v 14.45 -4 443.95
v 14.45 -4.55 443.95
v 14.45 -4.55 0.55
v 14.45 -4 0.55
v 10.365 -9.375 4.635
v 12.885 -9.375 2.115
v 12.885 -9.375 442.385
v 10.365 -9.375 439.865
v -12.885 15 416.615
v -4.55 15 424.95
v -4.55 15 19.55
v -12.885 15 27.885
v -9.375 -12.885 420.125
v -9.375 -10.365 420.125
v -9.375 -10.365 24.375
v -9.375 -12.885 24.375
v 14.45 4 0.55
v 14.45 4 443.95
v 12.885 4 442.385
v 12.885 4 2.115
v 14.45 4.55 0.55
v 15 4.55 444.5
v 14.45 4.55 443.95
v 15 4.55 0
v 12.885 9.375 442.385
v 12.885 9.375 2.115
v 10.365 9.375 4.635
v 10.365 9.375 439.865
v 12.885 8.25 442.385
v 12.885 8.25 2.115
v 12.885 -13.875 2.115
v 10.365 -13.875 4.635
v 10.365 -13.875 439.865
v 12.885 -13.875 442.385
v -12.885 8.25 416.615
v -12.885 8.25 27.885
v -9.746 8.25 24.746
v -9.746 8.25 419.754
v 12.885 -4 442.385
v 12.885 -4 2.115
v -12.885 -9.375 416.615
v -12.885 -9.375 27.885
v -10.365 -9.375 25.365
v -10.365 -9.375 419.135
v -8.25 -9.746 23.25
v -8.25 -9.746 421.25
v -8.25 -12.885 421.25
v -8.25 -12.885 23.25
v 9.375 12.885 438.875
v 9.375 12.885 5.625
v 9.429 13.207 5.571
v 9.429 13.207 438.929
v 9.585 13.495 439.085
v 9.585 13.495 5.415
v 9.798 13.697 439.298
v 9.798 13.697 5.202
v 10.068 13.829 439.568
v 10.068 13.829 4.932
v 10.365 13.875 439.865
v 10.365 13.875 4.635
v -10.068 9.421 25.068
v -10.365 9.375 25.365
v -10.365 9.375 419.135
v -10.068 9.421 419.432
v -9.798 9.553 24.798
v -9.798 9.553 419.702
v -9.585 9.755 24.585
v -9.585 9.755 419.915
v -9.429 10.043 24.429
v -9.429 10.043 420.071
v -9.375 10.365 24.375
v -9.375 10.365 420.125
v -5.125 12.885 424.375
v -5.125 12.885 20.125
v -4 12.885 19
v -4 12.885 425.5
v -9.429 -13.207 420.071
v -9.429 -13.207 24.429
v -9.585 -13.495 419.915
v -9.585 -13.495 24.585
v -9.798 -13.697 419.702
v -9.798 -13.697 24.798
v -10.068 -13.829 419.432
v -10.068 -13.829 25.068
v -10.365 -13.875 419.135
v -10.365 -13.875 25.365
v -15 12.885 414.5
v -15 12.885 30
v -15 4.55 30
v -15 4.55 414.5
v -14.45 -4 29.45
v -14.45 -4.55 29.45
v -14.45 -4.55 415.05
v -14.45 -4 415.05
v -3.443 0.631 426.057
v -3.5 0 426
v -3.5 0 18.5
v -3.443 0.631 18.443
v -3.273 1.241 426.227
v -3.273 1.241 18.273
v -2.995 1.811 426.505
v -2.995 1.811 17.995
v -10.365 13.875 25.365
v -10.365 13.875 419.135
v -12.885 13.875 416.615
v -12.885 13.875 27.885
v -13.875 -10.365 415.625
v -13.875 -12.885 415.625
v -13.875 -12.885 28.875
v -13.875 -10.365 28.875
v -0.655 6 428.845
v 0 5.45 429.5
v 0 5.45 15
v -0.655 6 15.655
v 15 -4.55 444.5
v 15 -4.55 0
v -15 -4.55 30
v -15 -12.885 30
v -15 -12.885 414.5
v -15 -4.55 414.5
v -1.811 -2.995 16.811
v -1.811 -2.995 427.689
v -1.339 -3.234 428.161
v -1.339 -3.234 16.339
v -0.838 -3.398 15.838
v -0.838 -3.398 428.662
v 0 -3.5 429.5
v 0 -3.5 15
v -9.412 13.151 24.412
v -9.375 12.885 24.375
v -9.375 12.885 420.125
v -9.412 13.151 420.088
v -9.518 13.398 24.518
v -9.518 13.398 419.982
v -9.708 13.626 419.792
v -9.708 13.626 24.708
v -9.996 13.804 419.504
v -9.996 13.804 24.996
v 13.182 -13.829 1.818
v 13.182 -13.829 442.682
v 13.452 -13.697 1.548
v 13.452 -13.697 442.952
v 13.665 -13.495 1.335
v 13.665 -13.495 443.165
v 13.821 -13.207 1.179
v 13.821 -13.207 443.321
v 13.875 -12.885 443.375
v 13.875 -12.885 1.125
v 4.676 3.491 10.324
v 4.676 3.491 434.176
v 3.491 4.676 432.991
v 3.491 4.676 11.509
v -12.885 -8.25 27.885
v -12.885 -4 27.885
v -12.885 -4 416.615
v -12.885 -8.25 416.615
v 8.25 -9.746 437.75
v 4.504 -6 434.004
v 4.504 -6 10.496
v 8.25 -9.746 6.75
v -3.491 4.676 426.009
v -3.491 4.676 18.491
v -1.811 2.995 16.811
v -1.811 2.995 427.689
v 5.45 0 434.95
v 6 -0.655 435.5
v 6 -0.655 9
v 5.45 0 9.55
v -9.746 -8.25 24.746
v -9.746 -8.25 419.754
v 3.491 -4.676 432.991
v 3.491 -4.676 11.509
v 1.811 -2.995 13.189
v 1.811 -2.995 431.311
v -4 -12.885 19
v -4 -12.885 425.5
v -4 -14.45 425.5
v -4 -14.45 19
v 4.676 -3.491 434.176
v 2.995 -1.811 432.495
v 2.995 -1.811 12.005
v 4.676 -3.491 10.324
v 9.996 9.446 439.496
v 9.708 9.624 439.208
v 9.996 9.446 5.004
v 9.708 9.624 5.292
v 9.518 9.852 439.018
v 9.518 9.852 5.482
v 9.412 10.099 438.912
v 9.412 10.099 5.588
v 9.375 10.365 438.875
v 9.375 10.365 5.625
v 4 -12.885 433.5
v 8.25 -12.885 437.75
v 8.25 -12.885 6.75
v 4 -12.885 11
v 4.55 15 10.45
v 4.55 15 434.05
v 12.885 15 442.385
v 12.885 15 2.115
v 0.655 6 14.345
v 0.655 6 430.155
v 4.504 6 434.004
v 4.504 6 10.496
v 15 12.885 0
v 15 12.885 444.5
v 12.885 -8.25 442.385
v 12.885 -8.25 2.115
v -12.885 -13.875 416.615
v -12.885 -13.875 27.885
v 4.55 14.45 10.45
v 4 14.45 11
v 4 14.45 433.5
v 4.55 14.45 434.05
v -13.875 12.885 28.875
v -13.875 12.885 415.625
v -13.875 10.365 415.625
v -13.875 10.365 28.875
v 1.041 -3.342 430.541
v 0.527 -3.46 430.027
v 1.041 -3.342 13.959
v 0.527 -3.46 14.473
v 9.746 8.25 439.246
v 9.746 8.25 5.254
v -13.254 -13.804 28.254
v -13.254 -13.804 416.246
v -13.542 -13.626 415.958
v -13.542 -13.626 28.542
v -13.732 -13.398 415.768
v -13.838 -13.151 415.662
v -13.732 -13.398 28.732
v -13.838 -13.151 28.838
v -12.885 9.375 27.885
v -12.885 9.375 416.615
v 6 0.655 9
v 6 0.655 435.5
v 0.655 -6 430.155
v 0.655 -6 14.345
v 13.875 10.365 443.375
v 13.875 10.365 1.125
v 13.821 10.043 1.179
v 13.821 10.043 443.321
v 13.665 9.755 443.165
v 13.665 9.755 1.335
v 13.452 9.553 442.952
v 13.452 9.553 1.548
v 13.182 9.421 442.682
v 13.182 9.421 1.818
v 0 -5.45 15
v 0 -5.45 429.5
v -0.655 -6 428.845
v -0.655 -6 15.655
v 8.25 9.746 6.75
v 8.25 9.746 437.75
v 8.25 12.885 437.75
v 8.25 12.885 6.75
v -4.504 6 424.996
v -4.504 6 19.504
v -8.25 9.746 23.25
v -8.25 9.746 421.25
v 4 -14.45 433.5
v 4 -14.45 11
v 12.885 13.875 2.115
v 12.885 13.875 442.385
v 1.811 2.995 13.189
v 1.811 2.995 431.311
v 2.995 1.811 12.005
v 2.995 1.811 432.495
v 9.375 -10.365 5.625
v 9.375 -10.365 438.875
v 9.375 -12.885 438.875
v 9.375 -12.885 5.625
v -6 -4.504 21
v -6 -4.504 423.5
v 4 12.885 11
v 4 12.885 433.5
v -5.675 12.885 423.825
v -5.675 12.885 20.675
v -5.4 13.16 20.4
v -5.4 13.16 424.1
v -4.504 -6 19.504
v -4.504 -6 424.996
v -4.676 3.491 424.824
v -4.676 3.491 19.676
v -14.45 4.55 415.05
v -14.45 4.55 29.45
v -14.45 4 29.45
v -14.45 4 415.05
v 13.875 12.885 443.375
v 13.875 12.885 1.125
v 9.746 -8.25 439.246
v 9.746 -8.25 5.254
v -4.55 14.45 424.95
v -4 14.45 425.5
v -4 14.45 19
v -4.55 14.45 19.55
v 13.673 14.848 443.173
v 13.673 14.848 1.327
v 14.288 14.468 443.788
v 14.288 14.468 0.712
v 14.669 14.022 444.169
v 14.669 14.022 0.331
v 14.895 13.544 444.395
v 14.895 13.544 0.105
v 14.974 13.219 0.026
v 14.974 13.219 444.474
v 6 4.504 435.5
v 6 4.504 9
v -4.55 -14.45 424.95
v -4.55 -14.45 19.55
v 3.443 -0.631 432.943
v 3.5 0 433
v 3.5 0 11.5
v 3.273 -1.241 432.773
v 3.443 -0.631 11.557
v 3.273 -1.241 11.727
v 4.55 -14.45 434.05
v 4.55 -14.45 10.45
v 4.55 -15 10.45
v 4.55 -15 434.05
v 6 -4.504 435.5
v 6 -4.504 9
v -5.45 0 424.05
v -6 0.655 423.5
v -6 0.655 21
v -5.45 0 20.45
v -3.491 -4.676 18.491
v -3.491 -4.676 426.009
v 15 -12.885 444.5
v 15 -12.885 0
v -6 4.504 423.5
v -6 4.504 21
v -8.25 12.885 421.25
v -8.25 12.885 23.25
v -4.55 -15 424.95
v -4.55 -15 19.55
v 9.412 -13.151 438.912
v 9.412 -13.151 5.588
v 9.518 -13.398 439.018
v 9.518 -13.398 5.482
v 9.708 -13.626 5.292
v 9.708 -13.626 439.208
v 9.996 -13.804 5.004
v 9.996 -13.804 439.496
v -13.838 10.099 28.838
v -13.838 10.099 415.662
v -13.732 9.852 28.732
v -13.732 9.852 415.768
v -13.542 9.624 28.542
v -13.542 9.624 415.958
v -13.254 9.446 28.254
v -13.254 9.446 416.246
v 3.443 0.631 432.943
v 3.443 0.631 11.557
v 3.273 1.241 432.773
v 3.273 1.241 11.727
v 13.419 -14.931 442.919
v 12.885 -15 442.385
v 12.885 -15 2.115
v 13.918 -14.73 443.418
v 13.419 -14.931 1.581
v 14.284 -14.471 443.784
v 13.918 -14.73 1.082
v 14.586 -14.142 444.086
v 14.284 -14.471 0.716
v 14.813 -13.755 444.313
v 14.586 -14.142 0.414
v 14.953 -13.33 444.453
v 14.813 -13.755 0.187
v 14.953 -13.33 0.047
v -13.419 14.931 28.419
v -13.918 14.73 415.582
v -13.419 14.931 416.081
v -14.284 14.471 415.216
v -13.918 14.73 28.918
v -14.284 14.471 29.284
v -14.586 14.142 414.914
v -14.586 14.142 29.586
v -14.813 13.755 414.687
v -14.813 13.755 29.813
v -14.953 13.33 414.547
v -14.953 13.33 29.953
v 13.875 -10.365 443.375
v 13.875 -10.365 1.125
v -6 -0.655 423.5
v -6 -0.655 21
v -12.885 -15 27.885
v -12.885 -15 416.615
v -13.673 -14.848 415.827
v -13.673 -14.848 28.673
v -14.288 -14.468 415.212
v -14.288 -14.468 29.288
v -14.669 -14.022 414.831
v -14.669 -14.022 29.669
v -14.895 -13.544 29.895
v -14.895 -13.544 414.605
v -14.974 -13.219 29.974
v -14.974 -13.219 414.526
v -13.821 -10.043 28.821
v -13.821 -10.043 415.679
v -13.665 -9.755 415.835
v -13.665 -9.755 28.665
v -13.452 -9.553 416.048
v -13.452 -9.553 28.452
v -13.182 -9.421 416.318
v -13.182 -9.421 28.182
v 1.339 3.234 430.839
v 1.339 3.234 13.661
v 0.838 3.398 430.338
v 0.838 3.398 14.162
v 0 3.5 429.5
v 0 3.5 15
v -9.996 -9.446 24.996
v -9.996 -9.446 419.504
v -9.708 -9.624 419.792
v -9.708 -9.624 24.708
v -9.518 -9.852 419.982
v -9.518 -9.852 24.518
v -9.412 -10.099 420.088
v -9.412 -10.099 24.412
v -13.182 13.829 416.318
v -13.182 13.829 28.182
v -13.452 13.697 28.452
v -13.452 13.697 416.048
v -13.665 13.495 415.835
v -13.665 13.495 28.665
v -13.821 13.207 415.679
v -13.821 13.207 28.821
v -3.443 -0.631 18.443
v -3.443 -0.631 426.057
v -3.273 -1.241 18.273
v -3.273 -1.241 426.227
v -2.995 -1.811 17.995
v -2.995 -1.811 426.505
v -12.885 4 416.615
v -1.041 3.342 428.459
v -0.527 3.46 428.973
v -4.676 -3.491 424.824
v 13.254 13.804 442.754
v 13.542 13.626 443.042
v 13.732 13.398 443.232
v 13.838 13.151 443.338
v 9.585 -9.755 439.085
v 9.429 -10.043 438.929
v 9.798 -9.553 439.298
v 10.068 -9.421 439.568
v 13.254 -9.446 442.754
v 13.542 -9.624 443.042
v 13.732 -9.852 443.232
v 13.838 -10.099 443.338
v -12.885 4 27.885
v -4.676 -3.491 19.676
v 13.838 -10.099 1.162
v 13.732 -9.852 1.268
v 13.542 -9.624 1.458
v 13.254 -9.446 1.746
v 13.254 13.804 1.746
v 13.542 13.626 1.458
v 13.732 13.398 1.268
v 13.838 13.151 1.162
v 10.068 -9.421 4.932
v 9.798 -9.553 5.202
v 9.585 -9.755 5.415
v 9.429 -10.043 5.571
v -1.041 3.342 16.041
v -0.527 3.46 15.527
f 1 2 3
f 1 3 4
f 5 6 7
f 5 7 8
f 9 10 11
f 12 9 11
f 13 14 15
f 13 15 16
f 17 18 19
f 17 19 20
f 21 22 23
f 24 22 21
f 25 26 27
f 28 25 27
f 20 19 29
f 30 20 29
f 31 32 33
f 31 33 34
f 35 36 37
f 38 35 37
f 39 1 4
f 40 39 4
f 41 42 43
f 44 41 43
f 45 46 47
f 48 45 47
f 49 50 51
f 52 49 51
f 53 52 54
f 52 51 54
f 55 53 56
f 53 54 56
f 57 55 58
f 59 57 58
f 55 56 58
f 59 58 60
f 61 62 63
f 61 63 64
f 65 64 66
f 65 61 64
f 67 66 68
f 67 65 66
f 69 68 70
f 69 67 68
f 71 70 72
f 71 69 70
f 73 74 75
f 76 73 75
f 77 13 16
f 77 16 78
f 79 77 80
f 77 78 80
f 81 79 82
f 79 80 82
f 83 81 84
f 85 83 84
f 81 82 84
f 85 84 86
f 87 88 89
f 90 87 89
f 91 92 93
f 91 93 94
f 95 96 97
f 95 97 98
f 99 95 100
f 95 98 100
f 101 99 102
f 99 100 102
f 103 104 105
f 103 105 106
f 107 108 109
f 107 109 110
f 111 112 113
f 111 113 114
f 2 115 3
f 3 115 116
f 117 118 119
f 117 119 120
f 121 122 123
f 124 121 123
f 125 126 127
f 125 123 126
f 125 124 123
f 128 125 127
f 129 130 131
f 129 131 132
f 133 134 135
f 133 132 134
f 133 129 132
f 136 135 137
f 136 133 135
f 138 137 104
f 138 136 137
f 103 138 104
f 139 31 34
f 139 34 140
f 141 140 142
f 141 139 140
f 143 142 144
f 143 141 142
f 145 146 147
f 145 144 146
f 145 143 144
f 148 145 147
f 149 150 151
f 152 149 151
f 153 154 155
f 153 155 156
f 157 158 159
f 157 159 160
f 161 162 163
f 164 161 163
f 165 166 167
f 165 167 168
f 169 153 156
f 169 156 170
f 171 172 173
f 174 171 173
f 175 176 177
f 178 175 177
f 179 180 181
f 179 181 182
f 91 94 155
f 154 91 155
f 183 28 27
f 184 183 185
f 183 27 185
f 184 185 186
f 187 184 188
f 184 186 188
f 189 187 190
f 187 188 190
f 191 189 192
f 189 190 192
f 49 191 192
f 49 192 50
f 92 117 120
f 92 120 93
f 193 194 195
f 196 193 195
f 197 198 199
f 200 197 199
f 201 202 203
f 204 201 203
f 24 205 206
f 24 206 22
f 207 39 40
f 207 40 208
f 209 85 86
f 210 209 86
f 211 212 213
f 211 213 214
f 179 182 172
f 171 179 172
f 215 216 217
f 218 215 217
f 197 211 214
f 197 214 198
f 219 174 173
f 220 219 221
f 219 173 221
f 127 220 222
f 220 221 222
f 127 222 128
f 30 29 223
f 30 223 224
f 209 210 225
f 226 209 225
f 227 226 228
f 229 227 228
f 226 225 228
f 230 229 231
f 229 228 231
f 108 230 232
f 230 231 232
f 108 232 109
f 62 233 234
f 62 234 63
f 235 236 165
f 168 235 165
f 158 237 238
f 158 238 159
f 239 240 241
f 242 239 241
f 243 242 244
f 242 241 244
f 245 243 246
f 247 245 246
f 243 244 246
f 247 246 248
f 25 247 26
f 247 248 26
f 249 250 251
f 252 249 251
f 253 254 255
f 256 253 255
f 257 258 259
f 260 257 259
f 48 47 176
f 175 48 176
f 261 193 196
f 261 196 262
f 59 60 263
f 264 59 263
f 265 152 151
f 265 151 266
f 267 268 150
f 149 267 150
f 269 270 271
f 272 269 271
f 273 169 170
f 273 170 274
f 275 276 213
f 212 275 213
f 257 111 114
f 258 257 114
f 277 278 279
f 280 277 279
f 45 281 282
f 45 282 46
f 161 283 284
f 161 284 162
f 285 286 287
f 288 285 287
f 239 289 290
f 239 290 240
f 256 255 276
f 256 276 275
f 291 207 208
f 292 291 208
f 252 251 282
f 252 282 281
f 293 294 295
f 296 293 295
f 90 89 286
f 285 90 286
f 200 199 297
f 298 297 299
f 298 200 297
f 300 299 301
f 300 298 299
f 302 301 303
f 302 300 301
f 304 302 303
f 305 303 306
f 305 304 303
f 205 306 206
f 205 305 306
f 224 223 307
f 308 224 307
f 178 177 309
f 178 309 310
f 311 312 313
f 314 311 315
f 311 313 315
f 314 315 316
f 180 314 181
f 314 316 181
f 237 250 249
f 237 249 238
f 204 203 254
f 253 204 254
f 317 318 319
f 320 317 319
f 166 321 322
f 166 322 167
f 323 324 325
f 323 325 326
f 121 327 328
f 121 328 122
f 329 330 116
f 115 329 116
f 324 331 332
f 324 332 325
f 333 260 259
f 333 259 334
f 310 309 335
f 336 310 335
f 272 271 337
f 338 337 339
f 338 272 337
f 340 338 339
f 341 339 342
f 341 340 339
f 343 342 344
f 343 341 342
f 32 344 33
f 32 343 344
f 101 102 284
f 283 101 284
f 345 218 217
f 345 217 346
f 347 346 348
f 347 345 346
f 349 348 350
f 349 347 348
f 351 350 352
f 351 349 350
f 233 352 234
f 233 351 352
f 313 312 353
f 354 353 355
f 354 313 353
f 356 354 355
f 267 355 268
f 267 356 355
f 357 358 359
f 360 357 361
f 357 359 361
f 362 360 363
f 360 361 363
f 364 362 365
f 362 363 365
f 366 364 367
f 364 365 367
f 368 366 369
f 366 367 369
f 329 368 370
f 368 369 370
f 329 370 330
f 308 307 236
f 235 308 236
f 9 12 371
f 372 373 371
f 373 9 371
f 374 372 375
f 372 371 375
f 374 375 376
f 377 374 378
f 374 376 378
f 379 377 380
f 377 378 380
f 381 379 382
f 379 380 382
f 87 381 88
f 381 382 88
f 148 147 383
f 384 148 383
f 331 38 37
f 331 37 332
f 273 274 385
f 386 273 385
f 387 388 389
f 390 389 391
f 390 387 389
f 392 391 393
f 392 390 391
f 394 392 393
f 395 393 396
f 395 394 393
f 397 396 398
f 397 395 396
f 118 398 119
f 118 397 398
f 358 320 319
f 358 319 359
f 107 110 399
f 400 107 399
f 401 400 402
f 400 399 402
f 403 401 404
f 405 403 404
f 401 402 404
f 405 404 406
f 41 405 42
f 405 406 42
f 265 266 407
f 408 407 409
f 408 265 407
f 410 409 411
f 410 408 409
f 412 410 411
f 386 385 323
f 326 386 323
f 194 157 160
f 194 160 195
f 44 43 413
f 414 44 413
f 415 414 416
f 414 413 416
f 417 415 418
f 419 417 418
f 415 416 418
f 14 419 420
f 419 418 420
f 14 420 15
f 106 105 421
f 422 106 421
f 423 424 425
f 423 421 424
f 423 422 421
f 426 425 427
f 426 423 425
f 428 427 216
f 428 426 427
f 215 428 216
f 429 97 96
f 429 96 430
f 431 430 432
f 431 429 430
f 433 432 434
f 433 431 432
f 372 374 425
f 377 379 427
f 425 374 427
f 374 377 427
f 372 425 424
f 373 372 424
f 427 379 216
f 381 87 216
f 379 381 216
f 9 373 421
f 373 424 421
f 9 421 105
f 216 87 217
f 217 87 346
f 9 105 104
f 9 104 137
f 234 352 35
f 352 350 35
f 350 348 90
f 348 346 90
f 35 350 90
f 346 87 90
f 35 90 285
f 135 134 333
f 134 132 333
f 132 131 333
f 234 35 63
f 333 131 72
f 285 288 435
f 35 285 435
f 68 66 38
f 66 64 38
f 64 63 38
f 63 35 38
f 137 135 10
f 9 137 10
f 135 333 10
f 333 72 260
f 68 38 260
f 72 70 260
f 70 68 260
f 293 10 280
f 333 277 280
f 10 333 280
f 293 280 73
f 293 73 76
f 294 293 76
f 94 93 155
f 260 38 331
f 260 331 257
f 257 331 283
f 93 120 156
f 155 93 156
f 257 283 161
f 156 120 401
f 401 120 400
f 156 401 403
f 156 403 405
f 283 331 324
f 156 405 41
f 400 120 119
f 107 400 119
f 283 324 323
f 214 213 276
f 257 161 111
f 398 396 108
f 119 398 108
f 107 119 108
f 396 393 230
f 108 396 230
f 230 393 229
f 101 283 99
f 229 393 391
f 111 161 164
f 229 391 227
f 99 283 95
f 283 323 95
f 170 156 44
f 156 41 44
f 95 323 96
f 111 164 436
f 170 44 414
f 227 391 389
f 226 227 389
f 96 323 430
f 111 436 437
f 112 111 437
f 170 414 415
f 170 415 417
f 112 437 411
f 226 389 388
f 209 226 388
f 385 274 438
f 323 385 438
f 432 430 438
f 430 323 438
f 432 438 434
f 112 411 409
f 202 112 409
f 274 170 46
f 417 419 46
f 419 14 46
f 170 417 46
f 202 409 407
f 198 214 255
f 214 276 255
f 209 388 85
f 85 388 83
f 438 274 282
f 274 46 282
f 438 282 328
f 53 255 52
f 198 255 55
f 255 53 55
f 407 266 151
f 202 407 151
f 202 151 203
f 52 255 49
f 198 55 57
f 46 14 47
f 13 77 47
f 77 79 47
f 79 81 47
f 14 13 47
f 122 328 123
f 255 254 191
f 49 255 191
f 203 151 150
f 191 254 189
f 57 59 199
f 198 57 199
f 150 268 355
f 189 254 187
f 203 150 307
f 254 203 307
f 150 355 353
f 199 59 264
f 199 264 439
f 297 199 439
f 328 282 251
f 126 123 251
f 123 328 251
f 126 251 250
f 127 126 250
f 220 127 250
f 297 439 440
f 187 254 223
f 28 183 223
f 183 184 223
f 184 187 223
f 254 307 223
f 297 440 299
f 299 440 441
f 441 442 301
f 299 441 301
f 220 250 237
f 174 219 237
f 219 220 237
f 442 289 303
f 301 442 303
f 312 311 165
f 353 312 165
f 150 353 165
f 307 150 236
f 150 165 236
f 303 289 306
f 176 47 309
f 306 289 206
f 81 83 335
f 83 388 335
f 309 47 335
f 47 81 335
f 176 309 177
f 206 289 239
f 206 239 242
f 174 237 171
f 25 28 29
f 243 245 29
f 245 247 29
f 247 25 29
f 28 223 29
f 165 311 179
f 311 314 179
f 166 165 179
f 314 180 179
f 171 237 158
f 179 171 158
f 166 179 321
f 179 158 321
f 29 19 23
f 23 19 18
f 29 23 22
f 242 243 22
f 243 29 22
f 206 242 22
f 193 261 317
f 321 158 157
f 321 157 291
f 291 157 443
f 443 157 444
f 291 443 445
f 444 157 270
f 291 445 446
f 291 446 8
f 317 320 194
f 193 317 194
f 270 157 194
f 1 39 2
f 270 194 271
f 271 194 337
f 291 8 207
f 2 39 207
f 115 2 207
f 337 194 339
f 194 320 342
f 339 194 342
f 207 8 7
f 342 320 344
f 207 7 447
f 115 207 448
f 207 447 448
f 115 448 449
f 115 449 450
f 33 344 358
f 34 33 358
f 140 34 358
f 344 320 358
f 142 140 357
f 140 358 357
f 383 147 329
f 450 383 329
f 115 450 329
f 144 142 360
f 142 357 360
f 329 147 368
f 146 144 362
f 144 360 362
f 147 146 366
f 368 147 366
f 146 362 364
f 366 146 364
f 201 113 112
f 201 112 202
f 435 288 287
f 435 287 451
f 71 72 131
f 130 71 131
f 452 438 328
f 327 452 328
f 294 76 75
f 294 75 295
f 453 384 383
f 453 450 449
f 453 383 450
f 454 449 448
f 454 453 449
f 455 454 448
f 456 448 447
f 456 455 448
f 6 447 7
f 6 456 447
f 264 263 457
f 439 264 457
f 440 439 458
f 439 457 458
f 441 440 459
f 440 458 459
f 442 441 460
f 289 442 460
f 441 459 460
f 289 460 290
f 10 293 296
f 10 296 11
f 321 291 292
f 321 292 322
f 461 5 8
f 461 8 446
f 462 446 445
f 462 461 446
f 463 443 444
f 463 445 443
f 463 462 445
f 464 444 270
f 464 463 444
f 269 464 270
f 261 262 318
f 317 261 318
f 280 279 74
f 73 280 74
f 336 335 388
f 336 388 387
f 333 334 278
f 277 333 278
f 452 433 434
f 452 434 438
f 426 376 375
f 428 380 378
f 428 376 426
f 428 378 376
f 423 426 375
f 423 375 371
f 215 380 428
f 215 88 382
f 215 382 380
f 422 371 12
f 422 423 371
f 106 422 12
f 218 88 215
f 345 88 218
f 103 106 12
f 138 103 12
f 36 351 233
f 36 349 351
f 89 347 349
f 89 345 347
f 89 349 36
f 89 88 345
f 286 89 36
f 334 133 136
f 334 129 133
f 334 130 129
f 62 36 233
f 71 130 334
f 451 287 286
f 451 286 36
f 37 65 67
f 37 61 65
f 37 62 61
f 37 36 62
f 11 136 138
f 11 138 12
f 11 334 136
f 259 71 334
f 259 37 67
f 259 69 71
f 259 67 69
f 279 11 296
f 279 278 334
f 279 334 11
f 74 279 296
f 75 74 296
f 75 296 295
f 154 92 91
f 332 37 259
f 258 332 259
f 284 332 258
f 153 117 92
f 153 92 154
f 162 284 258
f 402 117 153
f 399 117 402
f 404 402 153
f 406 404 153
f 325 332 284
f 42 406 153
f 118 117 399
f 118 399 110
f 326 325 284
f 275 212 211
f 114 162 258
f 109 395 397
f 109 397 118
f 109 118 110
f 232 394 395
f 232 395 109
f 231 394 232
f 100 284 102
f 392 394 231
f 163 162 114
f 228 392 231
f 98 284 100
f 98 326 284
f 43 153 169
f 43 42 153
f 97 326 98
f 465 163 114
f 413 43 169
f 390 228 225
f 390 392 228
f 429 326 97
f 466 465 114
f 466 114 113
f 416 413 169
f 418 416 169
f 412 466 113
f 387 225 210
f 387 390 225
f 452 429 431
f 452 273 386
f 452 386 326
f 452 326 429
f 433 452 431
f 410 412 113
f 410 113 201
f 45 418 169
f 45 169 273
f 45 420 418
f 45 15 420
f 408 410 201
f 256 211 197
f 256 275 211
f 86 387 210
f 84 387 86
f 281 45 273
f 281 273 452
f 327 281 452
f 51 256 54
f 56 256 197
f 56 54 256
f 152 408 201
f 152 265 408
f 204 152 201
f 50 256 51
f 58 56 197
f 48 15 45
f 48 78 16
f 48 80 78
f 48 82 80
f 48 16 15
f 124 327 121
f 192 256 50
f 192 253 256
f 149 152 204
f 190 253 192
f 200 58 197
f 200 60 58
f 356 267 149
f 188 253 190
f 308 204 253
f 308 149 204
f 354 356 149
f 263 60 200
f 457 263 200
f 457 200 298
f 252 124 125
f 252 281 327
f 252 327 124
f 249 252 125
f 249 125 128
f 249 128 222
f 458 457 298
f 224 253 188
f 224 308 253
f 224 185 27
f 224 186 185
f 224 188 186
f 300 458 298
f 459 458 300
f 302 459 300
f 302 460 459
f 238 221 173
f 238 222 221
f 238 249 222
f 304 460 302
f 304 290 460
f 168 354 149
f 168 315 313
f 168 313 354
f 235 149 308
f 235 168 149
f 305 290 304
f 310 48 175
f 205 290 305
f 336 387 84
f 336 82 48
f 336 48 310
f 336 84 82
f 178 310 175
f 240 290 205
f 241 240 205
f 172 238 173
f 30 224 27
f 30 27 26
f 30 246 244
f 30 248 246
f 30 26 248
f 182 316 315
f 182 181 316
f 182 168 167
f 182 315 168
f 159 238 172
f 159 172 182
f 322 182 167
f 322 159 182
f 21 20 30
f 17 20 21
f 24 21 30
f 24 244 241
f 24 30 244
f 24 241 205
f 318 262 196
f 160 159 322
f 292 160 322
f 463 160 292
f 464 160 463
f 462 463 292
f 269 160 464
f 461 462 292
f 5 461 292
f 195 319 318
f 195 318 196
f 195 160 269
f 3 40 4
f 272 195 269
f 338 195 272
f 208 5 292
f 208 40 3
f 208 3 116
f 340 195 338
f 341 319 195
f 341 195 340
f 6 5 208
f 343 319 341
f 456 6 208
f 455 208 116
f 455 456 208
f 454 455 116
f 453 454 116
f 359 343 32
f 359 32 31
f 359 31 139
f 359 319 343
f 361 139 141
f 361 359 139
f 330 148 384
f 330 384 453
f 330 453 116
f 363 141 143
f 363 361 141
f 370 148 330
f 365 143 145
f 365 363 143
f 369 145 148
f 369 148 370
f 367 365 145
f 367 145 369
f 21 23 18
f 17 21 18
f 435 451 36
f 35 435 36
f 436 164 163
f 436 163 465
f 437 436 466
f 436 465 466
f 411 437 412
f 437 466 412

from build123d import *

# Parameters (mm, degrees)
BOSS_EXTRUDE1_DEPTH     = 444.5
CUT_EXTRUDE1_DEPTH      = 1
CUT_EXTRUDE1_DEPTH_BACK = 445.5
CUT_EXTRUDE2_DEPTH      = 31


with BuildPart() as part:
    # Sketch4 → Boss-Extrude1 (new body)
    with BuildSketch(Plane.XY):
        with BuildLine():
            Line((0, -5.45), (0.655464476, -6))
            Line((0.655464476, -6), (4.504469158, -6))
            Line((4.504469158, -6), (8.25, -9.745530842))
            Line((8.25, -9.745530842), (8.25, -12.885))
            Line((8.25, -12.885), (4, -12.885))
            Line((4, -12.885), (4, -14.45))
            Line((4, -14.45), (4.55, -14.45))
            Line((4.55, -14.45), (4.55, -15))
            Line((4.55, -15), (12.885, -15))
            ThreePointArc((12.885, -15), (14.380530842, -14.380530842), (15, -12.885))
            Line((15, -12.885), (15, -4.55))
            Line((15, -4.55), (14.45, -4.55))
            Line((14.45, -4.55), (14.45, -4))
            Line((14.45, -4), (12.885, -4))
            Line((12.885, -4), (12.885, -8.25))
            Line((12.885, -8.25), (9.745530842, -8.25))
            Line((9.745530842, -8.25), (6, -4.504469158))
            Line((6, -4.504469158), (6, -0.655464476))
            Line((6, -0.655464476), (5.45, 0))
            Line((5.45, 0), (3.5, 0))
            ThreePointArc((3.5, 0), (3.371433308, -0.939913534), (2.995178599, -1.81077474))
            Line((2.995178599, -1.81077474), (4.675743591, -3.491339732))
            Line((4.675743591, -3.491339732), (3.491339732, -4.675743591))
            Line((3.491339732, -4.675743591), (1.81077474, -2.995178599))
            ThreePointArc((1.81077474, -2.995178599), (0.939913534, -3.371433308), (0, -3.5))
            Line((0, -3.5), (0, -5.45))
        make_face()
        with BuildLine():
            Line((9.375, -10.365), (9.375, -12.885))
            ThreePointArc((9.375, -12.885), (9.664964287, -13.585035713), (10.365, -13.875))
            Line((10.365, -13.875), (12.885, -13.875))
            ThreePointArc((12.885, -13.875), (13.585035713, -13.585035713), (13.875, -12.885))
            Line((13.875, -12.885), (13.875, -10.365))
            ThreePointArc((13.875, -10.365), (13.585035713, -9.664964287), (12.885, -9.375))
            Line((12.885, -9.375), (10.365, -9.375))
            ThreePointArc((10.365, -9.375), (9.664964287, -9.664964287), (9.375, -10.365))
        make_face(mode=Mode.SUBTRACT)
    extrude(amount=BOSS_EXTRUDE1_DEPTH)

    # Mirror1: part across plane


with BuildPart() as part_1:
    add(part.part)
    add(part.part.mirror(Plane(origin=(0, 0, 0), x_dir=(0, 0, 1), z_dir=(1, 0, 0))))

    # Mirror2: part across plane


with BuildPart() as part_2:
    add(part_1.part)
    add(part_1.part.mirror(Plane.ZX))

    # Sketch5 → Cut-Extrude1 (cut, two sides)
    with BuildSketch(Plane.XY.offset(444.5)) as cut_extrude1_sk:
        Polygon((-5.675, 12.885), (-5.4, 13.16), (-5.125, 12.885), align=None)
    extrude(amount=CUT_EXTRUDE1_DEPTH, mode=Mode.SUBTRACT)
    extrude(cut_extrude1_sk.sketch, amount=-CUT_EXTRUDE1_DEPTH_BACK, mode=Mode.SUBTRACT)

    # Sketch6 → Cut-Extrude2 (cut, through all)
    with BuildSketch(Plane.XZ.offset(15)):
        Polygon((15, 444.5), (-15, 444.5), (-15, 414.5), align=None)
        Polygon((15, 0), (-15, 0), (-15, 30), align=None)
    extrude(amount=-CUT_EXTRUDE2_DEPTH, mode=Mode.SUBTRACT)


solid = part_2.part
